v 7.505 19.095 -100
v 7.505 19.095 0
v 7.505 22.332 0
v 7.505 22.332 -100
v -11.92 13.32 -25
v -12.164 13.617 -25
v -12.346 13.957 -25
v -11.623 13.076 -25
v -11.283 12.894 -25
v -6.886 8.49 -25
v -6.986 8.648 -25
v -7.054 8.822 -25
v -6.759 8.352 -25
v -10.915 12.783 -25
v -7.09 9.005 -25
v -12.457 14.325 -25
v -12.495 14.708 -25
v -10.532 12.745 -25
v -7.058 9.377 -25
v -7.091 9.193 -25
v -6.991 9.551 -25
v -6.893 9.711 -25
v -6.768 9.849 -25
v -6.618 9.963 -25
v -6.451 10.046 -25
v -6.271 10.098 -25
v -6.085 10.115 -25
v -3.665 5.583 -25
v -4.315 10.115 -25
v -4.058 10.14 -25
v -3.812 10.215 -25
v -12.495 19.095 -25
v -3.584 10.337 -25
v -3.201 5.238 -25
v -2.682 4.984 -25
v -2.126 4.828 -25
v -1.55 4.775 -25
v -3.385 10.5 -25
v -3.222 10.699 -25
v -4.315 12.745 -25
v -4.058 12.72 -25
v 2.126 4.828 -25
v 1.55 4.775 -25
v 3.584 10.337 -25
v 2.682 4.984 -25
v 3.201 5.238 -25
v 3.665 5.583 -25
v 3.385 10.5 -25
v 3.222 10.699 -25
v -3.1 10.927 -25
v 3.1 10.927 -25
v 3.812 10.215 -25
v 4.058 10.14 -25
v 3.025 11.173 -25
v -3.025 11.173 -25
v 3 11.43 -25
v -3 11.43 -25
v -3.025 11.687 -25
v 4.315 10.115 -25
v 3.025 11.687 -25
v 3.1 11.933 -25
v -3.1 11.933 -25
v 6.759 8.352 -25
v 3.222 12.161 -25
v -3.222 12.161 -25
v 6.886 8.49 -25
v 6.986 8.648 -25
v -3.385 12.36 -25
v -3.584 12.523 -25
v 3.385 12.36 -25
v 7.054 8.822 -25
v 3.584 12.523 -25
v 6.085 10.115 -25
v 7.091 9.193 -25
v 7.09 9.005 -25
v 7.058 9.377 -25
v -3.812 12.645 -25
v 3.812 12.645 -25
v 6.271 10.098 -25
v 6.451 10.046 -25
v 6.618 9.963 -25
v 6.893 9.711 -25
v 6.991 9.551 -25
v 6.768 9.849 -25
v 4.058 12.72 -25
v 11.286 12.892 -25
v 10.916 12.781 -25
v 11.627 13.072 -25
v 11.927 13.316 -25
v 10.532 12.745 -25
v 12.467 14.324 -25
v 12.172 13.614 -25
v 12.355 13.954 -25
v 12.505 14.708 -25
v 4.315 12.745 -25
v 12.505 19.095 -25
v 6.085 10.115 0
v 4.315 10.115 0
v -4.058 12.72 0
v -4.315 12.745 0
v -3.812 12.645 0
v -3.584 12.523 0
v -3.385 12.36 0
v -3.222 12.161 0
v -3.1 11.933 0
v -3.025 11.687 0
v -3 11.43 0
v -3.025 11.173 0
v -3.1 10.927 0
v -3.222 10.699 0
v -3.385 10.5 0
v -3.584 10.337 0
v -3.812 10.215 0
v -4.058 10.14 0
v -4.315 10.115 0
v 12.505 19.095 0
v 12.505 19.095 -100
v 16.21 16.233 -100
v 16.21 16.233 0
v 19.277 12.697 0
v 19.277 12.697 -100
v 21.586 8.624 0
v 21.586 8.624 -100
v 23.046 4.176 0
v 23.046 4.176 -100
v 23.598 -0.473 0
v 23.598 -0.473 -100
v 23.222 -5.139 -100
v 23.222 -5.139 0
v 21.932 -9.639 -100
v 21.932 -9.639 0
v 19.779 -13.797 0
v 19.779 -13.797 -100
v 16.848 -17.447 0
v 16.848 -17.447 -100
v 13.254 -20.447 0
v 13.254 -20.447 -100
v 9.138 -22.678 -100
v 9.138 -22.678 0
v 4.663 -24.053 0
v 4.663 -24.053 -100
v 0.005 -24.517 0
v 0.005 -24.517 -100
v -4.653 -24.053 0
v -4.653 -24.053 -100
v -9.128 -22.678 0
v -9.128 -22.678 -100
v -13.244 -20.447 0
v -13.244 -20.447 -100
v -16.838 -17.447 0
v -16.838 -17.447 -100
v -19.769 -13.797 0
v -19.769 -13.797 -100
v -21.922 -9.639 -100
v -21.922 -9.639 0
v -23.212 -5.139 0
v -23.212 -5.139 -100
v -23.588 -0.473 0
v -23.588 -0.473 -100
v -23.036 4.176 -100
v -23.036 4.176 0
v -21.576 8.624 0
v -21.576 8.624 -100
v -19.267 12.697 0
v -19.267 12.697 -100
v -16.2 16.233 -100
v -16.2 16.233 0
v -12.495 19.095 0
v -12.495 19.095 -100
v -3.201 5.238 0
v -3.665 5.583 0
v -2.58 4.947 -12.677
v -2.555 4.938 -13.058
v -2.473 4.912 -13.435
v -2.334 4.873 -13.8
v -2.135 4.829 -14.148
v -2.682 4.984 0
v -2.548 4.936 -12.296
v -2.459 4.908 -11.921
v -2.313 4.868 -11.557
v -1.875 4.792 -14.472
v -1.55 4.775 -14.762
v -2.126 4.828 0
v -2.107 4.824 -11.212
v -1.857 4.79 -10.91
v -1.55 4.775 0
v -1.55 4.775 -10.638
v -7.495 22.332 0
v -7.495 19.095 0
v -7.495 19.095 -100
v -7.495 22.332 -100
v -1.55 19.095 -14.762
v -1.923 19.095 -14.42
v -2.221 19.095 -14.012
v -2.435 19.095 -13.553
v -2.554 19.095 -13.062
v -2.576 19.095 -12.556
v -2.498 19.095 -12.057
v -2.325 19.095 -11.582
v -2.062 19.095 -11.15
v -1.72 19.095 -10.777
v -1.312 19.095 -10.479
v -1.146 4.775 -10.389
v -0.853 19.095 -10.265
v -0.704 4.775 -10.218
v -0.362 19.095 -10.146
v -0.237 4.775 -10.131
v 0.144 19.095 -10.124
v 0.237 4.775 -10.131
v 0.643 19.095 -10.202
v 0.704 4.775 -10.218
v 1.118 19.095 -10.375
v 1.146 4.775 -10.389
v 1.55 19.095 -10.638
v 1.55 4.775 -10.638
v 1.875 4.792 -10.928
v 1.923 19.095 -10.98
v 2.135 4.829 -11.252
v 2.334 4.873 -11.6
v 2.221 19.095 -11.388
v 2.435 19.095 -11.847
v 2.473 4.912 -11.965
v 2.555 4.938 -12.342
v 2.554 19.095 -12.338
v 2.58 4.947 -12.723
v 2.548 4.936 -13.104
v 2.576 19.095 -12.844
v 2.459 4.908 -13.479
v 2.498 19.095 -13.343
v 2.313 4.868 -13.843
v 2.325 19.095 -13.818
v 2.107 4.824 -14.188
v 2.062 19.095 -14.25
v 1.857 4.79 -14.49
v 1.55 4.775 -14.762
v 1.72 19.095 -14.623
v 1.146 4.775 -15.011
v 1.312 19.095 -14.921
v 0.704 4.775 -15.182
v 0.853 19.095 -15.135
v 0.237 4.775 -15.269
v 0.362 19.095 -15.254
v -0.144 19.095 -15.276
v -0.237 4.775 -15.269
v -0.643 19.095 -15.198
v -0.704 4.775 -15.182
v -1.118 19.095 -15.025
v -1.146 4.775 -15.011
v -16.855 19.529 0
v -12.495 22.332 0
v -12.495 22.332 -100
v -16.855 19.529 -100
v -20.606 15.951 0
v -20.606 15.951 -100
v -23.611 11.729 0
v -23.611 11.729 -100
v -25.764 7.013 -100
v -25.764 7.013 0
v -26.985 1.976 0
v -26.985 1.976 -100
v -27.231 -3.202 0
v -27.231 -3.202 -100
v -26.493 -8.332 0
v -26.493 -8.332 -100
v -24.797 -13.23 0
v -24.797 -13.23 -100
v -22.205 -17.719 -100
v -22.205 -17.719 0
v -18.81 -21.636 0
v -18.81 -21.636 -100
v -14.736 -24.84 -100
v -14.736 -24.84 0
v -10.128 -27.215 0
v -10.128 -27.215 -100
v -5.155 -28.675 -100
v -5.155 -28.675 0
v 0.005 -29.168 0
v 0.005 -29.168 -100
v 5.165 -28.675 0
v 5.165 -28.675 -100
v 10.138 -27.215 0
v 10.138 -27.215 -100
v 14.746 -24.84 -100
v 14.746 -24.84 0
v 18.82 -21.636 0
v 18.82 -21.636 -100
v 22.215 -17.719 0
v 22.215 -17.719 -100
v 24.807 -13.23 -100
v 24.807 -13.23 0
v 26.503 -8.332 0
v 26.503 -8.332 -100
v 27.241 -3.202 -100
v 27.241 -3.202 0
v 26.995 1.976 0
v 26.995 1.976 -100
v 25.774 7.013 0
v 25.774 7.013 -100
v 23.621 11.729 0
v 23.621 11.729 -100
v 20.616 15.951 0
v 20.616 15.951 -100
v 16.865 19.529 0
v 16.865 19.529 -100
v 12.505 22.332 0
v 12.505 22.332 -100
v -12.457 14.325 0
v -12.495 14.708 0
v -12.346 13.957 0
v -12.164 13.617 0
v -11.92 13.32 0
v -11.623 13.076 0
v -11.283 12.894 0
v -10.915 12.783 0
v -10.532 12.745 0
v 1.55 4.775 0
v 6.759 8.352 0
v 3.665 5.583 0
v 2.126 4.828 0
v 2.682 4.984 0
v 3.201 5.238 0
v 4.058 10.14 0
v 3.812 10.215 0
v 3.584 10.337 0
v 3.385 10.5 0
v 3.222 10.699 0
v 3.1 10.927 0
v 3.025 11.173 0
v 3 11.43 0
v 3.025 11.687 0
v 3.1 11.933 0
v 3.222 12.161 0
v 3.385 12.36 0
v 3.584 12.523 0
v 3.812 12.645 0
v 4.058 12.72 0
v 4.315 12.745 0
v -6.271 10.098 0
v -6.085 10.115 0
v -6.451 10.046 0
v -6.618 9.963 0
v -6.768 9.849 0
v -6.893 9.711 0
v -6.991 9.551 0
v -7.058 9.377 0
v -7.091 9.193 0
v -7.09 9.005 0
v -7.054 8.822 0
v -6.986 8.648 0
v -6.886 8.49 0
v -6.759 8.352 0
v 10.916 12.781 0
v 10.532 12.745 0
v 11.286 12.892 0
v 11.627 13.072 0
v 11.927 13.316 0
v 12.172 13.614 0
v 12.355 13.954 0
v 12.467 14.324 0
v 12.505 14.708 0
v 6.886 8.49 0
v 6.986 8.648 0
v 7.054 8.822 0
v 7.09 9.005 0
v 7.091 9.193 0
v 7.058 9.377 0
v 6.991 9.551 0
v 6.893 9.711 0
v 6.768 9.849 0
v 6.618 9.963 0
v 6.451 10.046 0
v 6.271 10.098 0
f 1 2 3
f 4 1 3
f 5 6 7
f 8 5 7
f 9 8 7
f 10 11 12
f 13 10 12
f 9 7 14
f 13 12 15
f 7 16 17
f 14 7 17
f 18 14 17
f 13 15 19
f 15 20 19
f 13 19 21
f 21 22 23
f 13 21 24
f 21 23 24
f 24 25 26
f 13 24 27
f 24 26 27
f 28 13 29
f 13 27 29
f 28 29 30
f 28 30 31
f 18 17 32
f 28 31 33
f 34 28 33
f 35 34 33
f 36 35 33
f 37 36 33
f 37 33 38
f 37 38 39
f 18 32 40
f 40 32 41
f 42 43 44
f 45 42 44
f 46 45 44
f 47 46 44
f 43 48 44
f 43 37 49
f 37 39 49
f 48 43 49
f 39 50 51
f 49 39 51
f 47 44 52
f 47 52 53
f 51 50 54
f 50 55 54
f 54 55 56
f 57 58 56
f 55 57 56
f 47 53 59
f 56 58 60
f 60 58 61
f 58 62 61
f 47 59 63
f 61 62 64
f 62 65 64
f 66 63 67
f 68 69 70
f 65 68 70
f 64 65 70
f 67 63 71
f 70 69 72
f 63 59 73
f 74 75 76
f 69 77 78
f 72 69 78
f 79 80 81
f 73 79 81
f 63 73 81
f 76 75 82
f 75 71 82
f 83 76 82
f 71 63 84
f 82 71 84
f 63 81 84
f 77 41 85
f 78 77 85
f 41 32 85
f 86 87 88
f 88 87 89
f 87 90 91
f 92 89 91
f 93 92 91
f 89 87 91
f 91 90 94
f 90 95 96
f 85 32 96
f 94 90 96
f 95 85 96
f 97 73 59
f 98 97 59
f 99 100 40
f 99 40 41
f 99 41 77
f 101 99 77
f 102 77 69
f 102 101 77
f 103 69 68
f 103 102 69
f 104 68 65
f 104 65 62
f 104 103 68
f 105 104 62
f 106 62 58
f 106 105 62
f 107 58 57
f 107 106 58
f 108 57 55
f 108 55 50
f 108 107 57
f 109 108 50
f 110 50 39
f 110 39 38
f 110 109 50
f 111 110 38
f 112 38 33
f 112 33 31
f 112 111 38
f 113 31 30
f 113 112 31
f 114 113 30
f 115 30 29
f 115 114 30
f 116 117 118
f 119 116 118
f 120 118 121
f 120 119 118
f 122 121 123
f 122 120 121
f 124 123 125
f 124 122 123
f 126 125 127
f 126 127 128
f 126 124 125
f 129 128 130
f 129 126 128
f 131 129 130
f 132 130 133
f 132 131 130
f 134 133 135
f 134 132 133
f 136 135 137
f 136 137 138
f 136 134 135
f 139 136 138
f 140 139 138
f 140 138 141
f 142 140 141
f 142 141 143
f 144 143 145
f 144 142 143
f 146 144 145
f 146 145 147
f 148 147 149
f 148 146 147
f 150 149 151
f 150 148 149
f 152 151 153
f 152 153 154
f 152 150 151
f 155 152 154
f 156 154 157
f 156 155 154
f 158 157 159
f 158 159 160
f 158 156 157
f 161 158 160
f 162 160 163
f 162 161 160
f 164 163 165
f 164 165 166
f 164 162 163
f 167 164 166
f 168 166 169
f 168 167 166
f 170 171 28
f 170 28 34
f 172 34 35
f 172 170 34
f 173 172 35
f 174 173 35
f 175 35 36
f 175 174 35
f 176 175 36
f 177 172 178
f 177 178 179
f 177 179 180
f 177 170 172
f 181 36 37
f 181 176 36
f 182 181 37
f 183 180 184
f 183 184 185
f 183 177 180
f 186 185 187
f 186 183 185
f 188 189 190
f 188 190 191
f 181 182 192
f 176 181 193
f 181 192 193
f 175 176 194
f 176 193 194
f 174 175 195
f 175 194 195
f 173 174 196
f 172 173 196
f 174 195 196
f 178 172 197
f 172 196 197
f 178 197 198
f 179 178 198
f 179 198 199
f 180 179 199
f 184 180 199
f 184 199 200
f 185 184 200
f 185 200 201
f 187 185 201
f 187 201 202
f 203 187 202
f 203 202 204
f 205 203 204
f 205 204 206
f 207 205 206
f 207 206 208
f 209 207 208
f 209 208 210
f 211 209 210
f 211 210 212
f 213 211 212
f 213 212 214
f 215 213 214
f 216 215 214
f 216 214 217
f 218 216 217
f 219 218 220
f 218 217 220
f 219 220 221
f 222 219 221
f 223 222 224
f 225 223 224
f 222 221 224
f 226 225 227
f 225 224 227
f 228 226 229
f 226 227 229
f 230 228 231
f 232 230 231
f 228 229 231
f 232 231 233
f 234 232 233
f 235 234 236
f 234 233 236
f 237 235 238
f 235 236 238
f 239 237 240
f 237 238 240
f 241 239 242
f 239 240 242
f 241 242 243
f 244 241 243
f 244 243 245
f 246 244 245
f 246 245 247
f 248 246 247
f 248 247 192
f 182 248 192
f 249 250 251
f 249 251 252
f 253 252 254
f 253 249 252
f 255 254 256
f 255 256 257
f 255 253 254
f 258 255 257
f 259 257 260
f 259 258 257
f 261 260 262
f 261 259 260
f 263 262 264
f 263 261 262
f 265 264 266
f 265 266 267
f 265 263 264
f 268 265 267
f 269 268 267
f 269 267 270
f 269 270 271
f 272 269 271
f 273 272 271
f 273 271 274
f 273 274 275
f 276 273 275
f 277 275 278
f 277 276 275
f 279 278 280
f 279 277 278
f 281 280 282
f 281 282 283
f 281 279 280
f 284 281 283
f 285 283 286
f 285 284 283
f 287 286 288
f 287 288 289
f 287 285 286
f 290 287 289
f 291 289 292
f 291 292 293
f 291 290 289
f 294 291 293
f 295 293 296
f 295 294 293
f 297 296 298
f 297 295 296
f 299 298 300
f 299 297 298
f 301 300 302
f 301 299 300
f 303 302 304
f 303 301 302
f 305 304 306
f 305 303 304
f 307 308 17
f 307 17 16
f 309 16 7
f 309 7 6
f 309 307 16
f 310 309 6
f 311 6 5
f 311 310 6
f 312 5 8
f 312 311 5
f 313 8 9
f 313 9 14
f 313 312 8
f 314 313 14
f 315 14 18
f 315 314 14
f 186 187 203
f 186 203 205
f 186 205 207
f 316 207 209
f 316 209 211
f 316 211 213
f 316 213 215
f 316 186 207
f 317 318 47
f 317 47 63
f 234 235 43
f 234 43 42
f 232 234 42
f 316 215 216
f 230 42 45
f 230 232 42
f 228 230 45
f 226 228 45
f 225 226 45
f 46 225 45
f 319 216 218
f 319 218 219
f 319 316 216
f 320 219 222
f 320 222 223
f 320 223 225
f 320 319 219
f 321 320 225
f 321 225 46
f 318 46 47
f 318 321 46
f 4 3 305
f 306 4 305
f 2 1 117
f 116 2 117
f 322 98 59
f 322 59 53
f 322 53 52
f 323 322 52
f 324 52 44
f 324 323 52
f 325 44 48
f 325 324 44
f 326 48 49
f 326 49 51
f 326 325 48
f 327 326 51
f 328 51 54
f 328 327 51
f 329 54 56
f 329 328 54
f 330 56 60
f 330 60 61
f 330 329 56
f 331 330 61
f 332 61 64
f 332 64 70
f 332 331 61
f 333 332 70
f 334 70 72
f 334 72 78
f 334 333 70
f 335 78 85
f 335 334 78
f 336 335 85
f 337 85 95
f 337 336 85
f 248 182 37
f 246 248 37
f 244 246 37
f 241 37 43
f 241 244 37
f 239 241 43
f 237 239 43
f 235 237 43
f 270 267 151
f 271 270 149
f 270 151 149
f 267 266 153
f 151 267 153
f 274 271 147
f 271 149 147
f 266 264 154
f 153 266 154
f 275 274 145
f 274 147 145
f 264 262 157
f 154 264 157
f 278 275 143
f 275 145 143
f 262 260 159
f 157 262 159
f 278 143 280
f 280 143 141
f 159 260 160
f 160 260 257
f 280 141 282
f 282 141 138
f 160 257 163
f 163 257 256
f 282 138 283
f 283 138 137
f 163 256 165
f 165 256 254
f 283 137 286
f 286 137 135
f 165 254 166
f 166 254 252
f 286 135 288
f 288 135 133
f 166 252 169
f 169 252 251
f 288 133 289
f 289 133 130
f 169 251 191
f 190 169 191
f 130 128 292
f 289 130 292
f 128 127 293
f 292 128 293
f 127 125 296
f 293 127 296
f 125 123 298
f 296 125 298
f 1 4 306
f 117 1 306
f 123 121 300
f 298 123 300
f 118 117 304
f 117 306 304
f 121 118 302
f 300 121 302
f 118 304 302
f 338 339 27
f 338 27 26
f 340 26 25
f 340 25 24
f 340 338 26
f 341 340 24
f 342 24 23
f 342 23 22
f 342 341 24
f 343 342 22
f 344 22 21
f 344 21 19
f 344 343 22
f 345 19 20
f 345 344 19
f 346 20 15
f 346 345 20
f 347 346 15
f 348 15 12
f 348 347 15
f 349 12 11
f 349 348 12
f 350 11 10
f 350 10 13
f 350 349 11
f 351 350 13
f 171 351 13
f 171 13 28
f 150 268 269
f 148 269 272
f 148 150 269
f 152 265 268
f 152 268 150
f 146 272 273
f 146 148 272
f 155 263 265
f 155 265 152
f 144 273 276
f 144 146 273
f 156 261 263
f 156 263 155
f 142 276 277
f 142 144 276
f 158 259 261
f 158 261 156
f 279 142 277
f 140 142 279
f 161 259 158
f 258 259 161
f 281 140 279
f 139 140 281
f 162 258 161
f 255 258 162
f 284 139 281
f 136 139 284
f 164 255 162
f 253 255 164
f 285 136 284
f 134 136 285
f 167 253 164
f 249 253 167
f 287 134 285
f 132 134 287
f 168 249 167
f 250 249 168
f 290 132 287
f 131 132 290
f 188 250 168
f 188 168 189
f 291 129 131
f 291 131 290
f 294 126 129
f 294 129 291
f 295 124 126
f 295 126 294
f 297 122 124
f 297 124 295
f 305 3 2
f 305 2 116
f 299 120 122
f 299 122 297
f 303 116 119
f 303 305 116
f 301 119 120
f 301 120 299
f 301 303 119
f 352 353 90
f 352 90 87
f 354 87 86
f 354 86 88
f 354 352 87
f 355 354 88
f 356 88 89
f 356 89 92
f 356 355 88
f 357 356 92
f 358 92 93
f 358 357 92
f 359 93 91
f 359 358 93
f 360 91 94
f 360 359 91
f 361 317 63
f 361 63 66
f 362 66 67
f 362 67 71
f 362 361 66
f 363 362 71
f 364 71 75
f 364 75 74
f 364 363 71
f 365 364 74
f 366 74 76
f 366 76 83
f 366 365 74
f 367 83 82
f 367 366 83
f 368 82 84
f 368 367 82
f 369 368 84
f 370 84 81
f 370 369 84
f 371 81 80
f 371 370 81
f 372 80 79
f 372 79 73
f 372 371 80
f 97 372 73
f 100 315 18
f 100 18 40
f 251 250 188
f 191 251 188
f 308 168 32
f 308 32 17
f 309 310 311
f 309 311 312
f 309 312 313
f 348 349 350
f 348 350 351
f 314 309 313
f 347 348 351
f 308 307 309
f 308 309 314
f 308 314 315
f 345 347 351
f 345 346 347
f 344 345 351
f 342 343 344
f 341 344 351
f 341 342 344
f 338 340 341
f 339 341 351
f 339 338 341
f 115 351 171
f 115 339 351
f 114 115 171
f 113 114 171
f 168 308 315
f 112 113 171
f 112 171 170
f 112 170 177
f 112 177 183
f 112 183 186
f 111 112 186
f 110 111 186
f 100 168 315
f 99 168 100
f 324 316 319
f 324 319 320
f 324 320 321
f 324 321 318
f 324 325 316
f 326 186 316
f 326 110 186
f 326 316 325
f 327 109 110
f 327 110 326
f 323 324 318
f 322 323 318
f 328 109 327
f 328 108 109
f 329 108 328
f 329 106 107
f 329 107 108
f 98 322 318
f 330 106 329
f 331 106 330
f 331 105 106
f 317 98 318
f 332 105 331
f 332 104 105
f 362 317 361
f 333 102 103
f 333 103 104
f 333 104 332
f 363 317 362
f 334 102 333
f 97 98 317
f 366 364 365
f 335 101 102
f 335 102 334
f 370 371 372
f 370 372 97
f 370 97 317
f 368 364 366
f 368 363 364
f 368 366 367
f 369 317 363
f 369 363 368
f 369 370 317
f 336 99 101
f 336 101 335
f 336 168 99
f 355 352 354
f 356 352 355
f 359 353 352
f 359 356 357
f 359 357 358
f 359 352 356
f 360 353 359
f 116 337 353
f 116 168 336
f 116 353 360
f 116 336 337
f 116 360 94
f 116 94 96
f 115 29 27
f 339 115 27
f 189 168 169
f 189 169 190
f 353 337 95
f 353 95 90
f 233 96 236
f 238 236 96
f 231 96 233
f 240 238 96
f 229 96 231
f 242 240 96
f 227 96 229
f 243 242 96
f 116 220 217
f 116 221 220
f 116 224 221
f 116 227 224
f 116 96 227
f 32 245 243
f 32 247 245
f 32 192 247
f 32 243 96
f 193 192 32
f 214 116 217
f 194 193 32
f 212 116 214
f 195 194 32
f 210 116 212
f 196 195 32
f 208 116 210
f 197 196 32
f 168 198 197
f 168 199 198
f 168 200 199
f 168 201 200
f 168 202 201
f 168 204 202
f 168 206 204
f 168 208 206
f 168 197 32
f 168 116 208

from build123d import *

# Parameters (mm, degrees)
EXTRUDE1_DEPTH      = 25
SKETCH2_R           = 2.5796875
CUT_EXTRUDE1_DEPTH  = 32.407601389
SKETCH5_W           = 5
SKETCH5_H           = 3.237358095
BOSS_EXTRUDE1_DEPTH = 100


with BuildPart() as part:
    # Sketch1 → Extrude1 (new body)
    with BuildSketch(Plane.XY):
        with BuildLine():
            Line((4.315, 12.745), (10.532068835, 12.745))
            ThreePointArc((10.532068835, 12.745), (11.926539753, 13.316381695), (12.505, 14.707931165))
            Line((12.505, 14.707931165), (12.505, 19.095))
            Line((12.505, 19.095), (-12.495, 19.095))
            Line((-12.495, 19.095), (-12.495, 14.707931165))
            ThreePointArc((-12.495, 14.707931165), (-11.920070773, 13.319929227), (-10.532068835, 12.745))
            Line((-10.532068835, 12.745), (-4.315, 12.745))
            ThreePointArc((-4.315, 12.745), (-3, 11.43), (-4.315, 10.115))
            Line((-4.315, 10.115), (-6.085, 10.115))
            ThreePointArc((-6.085, 10.115), (-7.028446777, 9.465566469), (-6.758614403, 8.352441938))
            Line((-6.758614403, 8.352441938), (-3.664622209, 5.583010835))
            ThreePointArc((-3.664622209, 5.583010835), (-2.682085626, 4.983884868), (-1.550406707, 4.775))
            Line((-1.550406707, 4.775), (1.550406707, 4.775))
            ThreePointArc((1.550406707, 4.775), (2.682085626, 4.983884868), (3.664622209, 5.583010835))
            Line((3.664622209, 5.583010835), (6.758614403, 8.352441938))
            ThreePointArc((6.758614403, 8.352441938), (7.028446777, 9.465566469), (6.085, 10.115))
            Line((6.085, 10.115), (4.315, 10.115))
            ThreePointArc((4.315, 10.115), (3, 11.43), (4.315, 12.745))
        make_face()
    extrude(amount=-EXTRUDE1_DEPTH)

    # Sketch2 → Cut-Extrude1 (cut, through all)
    with BuildSketch(Plane(origin=(0, 19.095, 0), x_dir=(1, 0, 0), z_dir=(0, 1, 0))):
        with Locations(Location((0, 12.7, 0), (0, 0, 126.94195449))):
            Circle(SKETCH2_R)
    extrude(amount=-CUT_EXTRUDE1_DEPTH, mode=Mode.SUBTRACT)


with BuildPart() as body_2:
    # Sketch5 → Boss-Extrude1 (new body)
    with BuildSketch(Plane.XY):
        with BuildLine():
            Line((-12.495, 19.095), (-12.495, 22.332358095))
            ThreePointArc((-12.495, 22.332358095), (0.005, -29.167686251), (12.505, 22.332358095))
            Line((12.505, 22.332358095), (12.505, 19.095))
            ThreePointArc((12.505, 19.095), (0.005, -24.517190702), (-12.495, 19.095))
        make_face()
        with Locations((-9.995, 20.713679048)):
            Rectangle(SKETCH5_W, SKETCH5_H)
        with Locations((10.005, 20.713679048)):
            Rectangle(SKETCH5_W, SKETCH5_H)
    extrude(amount=-BOSS_EXTRUDE1_DEPTH)


solid = Compound([part.part, body_2.part])
